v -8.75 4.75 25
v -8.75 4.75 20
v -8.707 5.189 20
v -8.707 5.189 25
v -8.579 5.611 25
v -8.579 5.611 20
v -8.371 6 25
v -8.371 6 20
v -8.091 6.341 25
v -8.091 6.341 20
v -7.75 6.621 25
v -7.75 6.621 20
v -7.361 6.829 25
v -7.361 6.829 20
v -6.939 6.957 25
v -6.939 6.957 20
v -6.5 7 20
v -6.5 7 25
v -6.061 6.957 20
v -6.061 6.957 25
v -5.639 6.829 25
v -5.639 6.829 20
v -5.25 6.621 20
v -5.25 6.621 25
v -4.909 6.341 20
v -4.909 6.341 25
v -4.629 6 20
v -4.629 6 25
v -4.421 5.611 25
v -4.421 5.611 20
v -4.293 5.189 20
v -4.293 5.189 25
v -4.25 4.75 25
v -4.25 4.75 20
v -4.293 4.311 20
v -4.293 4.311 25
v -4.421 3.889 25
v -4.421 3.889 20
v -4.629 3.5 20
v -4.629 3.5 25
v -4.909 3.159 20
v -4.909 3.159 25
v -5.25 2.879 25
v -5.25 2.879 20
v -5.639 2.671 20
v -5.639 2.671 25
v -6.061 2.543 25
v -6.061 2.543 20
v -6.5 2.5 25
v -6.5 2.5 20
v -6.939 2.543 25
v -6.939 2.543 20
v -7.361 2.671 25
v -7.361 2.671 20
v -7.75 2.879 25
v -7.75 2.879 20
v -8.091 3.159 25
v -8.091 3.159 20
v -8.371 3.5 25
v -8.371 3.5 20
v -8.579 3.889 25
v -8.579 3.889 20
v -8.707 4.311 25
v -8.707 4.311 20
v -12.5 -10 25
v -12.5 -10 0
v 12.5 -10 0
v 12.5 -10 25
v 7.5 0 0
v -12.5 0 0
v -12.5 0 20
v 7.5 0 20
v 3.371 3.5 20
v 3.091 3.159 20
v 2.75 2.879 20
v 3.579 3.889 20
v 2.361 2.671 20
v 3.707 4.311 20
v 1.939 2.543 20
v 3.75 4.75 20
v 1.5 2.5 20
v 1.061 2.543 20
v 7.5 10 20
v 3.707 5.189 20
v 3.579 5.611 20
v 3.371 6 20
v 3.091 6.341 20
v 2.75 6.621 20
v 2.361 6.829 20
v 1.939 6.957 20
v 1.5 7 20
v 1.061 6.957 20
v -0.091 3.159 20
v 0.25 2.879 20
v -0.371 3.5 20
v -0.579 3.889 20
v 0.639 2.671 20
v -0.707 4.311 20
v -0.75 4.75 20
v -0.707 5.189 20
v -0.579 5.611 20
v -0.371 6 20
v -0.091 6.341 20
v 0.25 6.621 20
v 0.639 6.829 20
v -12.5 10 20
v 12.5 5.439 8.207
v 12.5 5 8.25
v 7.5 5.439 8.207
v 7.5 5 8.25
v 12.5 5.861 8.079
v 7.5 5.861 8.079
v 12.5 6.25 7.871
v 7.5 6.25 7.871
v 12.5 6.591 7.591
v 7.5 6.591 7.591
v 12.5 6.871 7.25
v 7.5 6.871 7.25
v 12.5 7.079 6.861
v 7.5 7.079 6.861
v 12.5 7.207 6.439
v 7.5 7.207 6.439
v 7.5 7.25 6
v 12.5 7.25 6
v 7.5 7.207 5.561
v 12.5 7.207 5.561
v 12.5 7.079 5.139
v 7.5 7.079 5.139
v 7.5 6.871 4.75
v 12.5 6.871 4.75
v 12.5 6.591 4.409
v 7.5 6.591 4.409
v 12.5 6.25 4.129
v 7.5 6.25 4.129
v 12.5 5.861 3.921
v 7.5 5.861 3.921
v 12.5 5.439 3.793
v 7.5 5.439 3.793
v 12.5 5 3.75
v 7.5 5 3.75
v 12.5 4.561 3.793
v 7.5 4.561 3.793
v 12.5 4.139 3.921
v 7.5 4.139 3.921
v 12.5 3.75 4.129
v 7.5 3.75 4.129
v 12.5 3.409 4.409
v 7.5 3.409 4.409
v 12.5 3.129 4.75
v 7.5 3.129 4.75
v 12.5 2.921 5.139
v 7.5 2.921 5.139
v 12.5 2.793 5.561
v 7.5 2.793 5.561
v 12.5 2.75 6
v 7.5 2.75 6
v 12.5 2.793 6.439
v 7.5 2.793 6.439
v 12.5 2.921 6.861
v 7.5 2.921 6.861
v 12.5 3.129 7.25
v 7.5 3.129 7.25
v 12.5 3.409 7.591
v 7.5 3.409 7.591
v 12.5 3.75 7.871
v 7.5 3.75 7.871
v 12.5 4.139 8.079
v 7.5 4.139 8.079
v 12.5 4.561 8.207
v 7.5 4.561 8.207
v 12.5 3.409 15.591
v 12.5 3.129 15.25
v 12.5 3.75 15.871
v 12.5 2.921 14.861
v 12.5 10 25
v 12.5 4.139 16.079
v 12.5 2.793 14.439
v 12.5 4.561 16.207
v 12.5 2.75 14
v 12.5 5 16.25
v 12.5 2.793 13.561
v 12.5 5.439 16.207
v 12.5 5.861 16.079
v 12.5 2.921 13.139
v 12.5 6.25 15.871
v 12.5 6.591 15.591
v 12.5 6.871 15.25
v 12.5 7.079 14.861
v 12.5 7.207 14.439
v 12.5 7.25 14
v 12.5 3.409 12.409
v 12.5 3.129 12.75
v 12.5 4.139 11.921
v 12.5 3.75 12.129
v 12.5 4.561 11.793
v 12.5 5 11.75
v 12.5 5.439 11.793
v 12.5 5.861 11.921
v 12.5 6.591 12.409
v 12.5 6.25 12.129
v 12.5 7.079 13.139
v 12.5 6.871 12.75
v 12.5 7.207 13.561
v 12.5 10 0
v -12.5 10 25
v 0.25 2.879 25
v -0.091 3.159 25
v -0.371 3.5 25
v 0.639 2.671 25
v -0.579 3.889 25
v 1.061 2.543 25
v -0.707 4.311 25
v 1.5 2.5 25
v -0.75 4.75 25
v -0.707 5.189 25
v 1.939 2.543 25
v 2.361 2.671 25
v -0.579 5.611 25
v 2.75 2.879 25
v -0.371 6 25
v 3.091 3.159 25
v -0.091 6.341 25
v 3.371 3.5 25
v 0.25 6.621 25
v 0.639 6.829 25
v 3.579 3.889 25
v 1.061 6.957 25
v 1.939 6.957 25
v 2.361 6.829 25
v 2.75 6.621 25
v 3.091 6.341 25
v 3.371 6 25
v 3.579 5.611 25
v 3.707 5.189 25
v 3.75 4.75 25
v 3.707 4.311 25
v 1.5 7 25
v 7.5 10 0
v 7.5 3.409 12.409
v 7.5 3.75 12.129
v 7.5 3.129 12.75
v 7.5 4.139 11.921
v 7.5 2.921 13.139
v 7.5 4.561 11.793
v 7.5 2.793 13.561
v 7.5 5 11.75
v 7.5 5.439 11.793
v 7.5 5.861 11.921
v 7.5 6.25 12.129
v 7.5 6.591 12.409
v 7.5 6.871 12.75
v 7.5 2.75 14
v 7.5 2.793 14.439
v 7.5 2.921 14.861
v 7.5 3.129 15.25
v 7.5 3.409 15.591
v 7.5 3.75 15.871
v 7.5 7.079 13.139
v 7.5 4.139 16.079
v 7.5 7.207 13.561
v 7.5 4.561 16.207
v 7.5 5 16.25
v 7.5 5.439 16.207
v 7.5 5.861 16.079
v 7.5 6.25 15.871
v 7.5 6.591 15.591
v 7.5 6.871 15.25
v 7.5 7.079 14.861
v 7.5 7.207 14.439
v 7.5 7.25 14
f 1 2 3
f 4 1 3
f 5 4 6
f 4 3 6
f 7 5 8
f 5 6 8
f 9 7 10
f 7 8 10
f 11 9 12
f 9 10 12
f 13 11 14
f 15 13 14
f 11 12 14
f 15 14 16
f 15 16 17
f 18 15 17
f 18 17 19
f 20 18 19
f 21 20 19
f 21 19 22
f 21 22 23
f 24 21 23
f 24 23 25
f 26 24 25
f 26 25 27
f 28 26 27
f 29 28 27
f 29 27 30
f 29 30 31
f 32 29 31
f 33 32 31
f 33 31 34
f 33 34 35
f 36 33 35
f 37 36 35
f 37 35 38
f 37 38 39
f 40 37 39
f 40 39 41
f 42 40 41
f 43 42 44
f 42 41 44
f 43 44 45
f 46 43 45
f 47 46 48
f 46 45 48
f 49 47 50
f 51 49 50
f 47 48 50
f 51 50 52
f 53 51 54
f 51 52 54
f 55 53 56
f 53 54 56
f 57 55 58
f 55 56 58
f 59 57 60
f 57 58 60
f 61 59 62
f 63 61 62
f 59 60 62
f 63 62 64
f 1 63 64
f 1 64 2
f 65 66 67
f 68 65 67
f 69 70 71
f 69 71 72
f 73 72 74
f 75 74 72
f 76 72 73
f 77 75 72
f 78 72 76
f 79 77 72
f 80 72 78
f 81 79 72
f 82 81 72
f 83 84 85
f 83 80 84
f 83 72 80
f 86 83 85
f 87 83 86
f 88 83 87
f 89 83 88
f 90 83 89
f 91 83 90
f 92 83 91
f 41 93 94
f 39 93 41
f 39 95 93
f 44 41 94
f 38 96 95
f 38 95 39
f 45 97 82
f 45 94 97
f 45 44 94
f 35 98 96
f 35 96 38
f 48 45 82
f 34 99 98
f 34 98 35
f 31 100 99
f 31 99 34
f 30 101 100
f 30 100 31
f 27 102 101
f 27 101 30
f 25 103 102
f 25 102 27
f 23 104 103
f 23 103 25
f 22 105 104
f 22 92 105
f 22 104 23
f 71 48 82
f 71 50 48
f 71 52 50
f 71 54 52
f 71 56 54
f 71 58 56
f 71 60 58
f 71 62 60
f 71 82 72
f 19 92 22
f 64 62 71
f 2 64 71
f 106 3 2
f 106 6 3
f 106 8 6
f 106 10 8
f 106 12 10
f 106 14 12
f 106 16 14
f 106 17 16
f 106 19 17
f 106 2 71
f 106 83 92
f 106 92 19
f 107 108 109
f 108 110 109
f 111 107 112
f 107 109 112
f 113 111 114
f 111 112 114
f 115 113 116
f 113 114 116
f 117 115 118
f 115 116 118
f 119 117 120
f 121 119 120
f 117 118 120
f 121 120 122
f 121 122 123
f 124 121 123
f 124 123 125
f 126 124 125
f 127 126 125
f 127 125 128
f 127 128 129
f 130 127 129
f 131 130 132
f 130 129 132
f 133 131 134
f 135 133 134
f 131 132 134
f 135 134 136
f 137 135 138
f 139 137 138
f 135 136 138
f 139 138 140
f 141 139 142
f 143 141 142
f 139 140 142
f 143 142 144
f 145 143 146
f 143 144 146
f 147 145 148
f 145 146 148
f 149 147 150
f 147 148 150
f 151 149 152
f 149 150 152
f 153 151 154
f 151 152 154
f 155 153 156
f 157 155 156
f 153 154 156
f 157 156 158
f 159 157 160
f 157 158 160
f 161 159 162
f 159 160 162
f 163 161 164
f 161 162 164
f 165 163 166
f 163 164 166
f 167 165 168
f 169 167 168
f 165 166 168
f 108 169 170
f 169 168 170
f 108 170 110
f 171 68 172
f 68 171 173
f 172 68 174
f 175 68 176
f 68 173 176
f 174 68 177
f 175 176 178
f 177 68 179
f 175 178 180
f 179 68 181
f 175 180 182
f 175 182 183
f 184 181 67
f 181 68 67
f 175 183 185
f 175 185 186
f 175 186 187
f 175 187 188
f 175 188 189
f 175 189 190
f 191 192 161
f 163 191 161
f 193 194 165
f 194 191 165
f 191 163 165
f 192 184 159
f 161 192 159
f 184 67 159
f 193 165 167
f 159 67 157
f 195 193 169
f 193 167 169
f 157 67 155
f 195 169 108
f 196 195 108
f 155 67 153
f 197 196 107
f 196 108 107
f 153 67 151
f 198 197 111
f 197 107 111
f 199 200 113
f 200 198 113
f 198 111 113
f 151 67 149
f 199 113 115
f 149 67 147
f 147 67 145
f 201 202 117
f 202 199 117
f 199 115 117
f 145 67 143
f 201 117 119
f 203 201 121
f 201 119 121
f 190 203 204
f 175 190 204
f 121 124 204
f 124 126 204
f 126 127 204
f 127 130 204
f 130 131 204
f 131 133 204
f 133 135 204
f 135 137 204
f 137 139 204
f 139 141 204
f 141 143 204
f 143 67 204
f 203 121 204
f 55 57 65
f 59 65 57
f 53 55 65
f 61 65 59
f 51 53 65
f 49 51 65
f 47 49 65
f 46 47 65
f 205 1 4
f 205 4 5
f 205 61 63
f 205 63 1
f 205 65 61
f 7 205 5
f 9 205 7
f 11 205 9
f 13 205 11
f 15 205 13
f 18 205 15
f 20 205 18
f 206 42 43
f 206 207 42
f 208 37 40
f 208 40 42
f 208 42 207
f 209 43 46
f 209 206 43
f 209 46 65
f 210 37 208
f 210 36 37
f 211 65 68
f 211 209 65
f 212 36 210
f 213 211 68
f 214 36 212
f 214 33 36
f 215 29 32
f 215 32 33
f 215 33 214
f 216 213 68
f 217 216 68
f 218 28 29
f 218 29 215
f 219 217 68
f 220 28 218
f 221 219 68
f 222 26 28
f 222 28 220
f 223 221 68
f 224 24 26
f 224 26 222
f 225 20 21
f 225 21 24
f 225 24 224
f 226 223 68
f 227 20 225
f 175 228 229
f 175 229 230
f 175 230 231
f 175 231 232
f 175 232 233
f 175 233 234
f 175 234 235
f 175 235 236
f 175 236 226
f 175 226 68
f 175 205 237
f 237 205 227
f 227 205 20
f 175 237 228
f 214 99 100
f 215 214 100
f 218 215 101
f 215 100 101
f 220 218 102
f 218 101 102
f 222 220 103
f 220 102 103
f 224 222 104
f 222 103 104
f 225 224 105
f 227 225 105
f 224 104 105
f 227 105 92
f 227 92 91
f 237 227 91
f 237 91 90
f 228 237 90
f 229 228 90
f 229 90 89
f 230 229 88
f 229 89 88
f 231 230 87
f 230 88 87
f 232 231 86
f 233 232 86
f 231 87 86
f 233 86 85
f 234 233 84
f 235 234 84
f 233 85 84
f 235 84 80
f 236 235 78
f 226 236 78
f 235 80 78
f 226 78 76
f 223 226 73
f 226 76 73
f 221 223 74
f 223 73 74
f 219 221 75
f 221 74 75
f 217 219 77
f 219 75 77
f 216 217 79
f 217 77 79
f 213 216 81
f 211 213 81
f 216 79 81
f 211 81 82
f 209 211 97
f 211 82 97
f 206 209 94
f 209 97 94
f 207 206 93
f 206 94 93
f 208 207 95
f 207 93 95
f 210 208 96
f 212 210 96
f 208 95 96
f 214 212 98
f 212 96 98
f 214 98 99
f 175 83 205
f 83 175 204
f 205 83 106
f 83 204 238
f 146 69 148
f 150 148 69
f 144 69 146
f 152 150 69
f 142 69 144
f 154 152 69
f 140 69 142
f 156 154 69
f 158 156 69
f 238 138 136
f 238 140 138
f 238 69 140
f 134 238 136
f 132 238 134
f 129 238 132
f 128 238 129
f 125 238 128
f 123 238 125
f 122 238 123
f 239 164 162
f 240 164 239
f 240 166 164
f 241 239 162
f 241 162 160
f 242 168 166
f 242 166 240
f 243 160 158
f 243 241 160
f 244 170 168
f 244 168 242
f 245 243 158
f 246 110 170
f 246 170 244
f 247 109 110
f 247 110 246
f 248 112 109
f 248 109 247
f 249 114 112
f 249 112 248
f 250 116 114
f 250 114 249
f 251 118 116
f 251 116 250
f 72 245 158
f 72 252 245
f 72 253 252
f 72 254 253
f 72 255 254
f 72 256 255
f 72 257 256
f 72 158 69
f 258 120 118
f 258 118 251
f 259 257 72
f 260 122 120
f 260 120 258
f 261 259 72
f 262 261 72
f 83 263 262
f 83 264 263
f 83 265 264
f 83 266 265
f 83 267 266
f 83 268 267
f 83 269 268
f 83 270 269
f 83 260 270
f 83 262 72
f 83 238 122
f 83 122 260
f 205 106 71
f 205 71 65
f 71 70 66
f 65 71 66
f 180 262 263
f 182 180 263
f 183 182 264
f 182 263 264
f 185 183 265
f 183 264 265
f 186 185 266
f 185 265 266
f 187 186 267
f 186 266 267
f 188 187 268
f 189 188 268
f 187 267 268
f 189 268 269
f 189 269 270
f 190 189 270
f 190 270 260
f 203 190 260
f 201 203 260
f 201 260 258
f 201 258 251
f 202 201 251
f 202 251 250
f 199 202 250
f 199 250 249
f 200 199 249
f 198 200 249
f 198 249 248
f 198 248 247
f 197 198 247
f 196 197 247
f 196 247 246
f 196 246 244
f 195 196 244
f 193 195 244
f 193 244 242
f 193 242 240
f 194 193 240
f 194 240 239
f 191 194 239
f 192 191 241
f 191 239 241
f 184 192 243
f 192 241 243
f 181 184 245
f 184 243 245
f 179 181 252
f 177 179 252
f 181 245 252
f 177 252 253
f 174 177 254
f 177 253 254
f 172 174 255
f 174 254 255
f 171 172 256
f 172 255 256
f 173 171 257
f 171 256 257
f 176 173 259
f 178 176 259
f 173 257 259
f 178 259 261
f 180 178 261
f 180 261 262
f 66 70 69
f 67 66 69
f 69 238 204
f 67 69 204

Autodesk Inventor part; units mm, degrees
ref_plane "YZ Plane" through (0, 0, 0) normal (1, 0, 0) x (0, 1, 0)
ref_plane "XZ Plane" through (0, 0, 0) normal (0, 1, 0) x (-1, 0, 0)
ref_plane "XY Plane" through (0, 0, 0) normal (0, 0, 1) x (1, 0, 0)
sketch "Sketch1" plane through (0, 0, 0) normal (0, 0, 1) x (1, 0, 0)
  line L0 (-12.5, -10) -> (12.5, -10)
  line L1 (12.5, -10) -> (12.5, 10)
  line L2 (12.5, 10) -> (-12.5, 10)
  line L3 (-12.5, 10) -> (-12.5, -10)
  line L4 (-12.5, -10) -> (12.5, 10) construction
  line L5 (12.5, -10) -> (-12.5, 10) construction
  point P0 (0, 0)
  dimension "d0" = 25
  dimension "d1" = 20
extrude "Extrusion1" add sketch "Sketch1" along normal blind 25
sketch "Sketch2" plane through (-12.5, 10, 0) normal (0, 1, 0) x (1, 0, 0)
  line L0 (0, 0) -> (25, 0) projected
  line L1 (0, 0) -> (20, 0)
  line L2 (20, 0) -> (20, -20)
  line L3 (20, -20) -> (0, -20)
  line L4 (0, -20) -> (0, 0)
  point P0 (12.5, 0)
  point P1 (20, 0)
  dimension "d4" = 20
  dimension "d5" = 20
extrude "Extrusion2" cut sketch "Sketch2" against normal blind 10
sketch "Sketch3" plane through (7.5, 10, 0) normal (-1, 0, 0) x (0, 0, 1)
  circle A0 centre (6, -5) radius 2.25
  circle A1 centre (14, -5) radius 2.25
  line L0 (0, 0) -> (20, 0) projected
  line L1 (20, -10) -> (0, -10) projected
  line L2 (0, -10) -> (0, 0) projected
  line L3 (20, 0) -> (20, -10) projected
  dimension "d8" = 4.5
  dimension "d9" = 4.5
  dimension "d10" = 5
  dimension "d11" = 10
  dimension "d12" = 5
  dimension "d14" = 20
  dimension "d17" = 8
  dimension "d18" = 6
extrude "Extrusion3" cut sketch "Sketch3" against normal blind 5 contours A0 | A1
thread "Thread1" size "M4.5x0.75" class "6H" standard "ANSI Metric M Profile" length 100
thread "Thread2" size "M4.5x0.75" class "6H" standard "ANSI Metric M Profile" length 100
sketch "Sketch4" plane through (7.5, 10, 20) normal (0, 0, -1) x (-1, 0, 0)
  circle A0 centre (6, -5.25) radius 2.25
  circle A1 centre (14, -5.25) radius 2.25
  line L0 (0, 0) -> (20, 0) projected
  line L1 (20, 0) -> (20, -10) projected
  line L2 (0, 0) -> (0, -10) projected
  point P0 (7.5, -10)
  dimension "d25" = 4.5
  dimension "d26" = 4.5
  dimension "d27" = 8
  dimension "d28" = 3
  dimension "d29" = 3
  dimension "d30" = 6
  dimension "d31" = 6
extrude "Extrusion4" cut sketch "Sketch4" against normal blind 5
thread "Thread3" size "M4.5x0.75" class "6H" standard "ANSI Metric M Profile" length 100
thread "Thread4" size "M4.5x0.75" class "6H" standard "ANSI Metric M Profile" length 100
properties part number "CONTOL_COMBI"
